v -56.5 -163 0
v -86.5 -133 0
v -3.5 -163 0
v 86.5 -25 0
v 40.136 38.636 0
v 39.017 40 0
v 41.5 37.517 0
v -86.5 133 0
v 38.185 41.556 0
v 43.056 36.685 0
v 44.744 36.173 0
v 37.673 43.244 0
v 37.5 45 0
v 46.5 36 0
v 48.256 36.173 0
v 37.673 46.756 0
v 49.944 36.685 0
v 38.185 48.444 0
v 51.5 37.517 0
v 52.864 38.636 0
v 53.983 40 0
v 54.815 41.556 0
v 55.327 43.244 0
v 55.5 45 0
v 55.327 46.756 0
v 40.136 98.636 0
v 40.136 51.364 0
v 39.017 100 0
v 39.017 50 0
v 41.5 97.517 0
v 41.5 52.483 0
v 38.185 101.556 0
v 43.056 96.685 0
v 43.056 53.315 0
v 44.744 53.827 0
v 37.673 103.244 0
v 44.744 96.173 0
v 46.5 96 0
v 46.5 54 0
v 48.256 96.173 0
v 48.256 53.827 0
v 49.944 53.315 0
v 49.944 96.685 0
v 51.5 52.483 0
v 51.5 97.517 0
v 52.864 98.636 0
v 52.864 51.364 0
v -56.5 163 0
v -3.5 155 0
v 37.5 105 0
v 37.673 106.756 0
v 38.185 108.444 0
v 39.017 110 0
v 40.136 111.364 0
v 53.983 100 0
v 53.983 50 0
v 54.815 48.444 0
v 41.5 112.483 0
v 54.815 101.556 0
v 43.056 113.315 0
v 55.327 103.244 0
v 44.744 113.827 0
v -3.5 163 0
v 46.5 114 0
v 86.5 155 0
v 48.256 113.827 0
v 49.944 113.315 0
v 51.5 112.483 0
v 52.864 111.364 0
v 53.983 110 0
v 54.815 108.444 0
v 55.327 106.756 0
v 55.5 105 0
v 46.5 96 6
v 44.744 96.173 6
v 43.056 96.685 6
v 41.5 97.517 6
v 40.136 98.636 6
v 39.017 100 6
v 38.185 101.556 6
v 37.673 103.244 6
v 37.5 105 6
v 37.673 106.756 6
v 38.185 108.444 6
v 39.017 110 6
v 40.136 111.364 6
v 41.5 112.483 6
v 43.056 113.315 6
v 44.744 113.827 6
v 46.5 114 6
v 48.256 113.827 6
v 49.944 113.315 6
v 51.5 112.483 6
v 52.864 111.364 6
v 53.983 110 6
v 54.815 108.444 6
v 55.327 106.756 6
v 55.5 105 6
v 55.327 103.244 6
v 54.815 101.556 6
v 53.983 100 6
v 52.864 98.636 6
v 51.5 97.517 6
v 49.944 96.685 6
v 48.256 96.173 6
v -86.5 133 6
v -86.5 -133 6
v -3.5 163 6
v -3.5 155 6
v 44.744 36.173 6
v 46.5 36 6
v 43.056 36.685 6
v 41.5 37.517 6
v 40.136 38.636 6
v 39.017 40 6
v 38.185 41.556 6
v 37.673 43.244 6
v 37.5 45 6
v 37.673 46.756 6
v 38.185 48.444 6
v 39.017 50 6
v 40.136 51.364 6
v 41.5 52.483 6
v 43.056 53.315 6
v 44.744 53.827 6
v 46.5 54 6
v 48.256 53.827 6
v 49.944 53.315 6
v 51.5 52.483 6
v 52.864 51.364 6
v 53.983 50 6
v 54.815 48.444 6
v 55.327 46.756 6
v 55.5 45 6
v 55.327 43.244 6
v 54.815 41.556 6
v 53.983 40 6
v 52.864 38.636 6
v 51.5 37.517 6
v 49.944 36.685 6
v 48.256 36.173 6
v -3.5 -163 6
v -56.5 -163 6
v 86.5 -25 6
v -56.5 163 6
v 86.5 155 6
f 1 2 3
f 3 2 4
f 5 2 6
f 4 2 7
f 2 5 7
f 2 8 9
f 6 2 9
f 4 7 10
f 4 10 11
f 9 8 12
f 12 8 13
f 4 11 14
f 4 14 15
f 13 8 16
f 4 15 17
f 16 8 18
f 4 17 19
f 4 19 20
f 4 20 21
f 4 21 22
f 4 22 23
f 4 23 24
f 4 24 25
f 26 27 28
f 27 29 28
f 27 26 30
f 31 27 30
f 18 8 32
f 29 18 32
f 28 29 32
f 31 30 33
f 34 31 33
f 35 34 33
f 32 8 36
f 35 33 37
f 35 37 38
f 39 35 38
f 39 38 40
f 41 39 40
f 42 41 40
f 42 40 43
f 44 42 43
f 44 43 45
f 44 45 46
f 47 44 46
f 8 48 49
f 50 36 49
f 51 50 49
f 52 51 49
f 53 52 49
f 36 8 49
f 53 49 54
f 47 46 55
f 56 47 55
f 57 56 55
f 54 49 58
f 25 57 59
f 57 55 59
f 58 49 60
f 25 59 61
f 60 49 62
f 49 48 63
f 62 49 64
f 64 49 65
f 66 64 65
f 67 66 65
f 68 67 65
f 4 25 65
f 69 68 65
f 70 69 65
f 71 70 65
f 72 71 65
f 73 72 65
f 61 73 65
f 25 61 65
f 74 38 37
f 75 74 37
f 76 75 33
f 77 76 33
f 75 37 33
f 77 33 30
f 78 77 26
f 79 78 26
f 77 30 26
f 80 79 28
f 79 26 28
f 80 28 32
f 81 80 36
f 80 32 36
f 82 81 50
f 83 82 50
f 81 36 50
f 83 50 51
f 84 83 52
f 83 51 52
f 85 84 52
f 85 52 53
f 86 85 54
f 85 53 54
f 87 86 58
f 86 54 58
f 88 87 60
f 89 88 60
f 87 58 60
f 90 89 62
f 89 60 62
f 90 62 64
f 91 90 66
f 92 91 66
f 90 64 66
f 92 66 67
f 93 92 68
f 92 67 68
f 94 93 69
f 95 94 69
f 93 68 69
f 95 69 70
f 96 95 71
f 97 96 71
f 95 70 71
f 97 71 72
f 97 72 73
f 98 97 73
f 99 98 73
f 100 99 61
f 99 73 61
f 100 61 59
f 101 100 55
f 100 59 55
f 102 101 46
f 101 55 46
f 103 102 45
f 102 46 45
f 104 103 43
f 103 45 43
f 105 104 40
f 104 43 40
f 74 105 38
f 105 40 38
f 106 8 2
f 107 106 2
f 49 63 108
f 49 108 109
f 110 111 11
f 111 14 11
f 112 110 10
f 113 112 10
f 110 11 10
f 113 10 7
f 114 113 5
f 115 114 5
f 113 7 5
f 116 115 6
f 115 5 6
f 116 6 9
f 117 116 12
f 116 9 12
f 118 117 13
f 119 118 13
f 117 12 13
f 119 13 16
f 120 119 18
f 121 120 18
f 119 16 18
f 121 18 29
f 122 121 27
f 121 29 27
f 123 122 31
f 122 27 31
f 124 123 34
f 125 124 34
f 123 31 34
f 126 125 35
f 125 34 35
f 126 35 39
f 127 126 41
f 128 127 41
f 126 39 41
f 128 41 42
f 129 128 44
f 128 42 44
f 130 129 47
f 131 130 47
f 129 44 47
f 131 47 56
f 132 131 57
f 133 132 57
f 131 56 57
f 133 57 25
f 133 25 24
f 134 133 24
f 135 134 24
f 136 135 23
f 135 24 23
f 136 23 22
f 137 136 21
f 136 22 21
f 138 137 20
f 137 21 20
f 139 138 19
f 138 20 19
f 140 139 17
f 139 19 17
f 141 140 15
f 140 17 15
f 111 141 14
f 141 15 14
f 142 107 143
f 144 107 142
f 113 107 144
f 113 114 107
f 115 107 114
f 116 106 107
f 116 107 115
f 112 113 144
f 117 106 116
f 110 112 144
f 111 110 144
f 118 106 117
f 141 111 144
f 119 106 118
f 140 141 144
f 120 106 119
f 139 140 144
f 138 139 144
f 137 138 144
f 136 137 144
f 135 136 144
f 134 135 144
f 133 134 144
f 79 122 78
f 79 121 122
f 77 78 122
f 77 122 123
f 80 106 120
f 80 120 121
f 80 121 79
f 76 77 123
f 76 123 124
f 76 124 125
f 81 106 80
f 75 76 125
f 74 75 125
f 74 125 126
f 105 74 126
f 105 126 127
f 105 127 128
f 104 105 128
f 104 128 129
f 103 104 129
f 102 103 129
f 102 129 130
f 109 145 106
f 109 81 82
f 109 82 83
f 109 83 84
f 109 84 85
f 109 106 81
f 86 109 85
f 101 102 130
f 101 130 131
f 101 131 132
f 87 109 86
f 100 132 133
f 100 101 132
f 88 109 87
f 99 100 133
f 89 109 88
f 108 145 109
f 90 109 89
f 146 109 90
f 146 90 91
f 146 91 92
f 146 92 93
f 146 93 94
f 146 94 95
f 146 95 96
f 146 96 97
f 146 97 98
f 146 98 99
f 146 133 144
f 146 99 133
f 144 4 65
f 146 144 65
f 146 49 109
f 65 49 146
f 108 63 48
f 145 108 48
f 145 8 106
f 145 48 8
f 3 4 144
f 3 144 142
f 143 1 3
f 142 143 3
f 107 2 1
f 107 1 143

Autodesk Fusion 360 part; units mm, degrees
sketch "スケッチ1" plane through (0, 0, 0) normal (0, 0, 1) x (1, 0, 0)
  line L0 (-3.5, 163) -> (-86.5, 163)
  line L1 (-86.5, 163) -> (-86.5, -163)
  line L2 (-86.5, -163) -> (-3.5, -163)
  line L3 (86.5, -25) -> (86.5, 155)
  line L4 (82.2546, 155) -> (-86.5, -163) construction
  line L5 (-86.5, 163) -> (46.1223, -86.9125) construction
  line L6 (-3.5, 163) -> (-3.5, 155)
  line L7 (-3.5, 155) -> (86.5, 155)
  line L8 (-86.5, -163) -> (-3.5, -163) construction
  line L9 (86.5, -25) -> (-3.5, -163)
  dimension "d2" = 326
  dimension "d5" = 83
extrude "押し出し1" add sketch "スケッチ1" along normal blind 6
chamfer "面取り1" distance 30 angle 45 2 edges at (-86.5, -163, 3) (-86.5, 163, 3)
sketch "スケッチ2" plane through (0, 0, 6) normal (0, 0, 1) x (-1, 0, 0)
  line L0 (56.5, -163) -> (86.5, -133)
  line L1 (86.5, -133) -> (86.5, 133)
  line L2 (86.5, 133) -> (56.5, 163)
  line L3 (56.5, 163) -> (3.5, 163)
  line L4 (3.5, 163) -> (-86.5, 25)
  line L5 (-86.5, 25) -> (-86.5, -155)
  line L6 (-86.5, -155) -> (3.5, -155)
  line L7 (3.5, -155) -> (3.5, -163)
  line L8 (3.5, -163) -> (56.5, -163)
  line L9 (-86.5, -155) -> (-46.5, -155) construction
  line L10 (-46.5, -155) -> (-46.5, -105) construction
  line L11 (-46.5, -105) -> (-86.5, -105) construction
  line L12 (-86.5, -105) -> (-86.5, -155) construction
  line L13 (-46.5, -105) -> (-46.5, -45) construction
  point P0 (-46.5, -105)
  point P1 (-46.5, -45)
  dimension "d10" = 40
  dimension "d11" = 50
  dimension "d12" = 60
hole "穴1" at (46.5, 105, 6) at (46.5, 45, 6) direction (0, 0, -1) diameter 18 end through all
equation "d5 = 30 mm + 53 mm"
